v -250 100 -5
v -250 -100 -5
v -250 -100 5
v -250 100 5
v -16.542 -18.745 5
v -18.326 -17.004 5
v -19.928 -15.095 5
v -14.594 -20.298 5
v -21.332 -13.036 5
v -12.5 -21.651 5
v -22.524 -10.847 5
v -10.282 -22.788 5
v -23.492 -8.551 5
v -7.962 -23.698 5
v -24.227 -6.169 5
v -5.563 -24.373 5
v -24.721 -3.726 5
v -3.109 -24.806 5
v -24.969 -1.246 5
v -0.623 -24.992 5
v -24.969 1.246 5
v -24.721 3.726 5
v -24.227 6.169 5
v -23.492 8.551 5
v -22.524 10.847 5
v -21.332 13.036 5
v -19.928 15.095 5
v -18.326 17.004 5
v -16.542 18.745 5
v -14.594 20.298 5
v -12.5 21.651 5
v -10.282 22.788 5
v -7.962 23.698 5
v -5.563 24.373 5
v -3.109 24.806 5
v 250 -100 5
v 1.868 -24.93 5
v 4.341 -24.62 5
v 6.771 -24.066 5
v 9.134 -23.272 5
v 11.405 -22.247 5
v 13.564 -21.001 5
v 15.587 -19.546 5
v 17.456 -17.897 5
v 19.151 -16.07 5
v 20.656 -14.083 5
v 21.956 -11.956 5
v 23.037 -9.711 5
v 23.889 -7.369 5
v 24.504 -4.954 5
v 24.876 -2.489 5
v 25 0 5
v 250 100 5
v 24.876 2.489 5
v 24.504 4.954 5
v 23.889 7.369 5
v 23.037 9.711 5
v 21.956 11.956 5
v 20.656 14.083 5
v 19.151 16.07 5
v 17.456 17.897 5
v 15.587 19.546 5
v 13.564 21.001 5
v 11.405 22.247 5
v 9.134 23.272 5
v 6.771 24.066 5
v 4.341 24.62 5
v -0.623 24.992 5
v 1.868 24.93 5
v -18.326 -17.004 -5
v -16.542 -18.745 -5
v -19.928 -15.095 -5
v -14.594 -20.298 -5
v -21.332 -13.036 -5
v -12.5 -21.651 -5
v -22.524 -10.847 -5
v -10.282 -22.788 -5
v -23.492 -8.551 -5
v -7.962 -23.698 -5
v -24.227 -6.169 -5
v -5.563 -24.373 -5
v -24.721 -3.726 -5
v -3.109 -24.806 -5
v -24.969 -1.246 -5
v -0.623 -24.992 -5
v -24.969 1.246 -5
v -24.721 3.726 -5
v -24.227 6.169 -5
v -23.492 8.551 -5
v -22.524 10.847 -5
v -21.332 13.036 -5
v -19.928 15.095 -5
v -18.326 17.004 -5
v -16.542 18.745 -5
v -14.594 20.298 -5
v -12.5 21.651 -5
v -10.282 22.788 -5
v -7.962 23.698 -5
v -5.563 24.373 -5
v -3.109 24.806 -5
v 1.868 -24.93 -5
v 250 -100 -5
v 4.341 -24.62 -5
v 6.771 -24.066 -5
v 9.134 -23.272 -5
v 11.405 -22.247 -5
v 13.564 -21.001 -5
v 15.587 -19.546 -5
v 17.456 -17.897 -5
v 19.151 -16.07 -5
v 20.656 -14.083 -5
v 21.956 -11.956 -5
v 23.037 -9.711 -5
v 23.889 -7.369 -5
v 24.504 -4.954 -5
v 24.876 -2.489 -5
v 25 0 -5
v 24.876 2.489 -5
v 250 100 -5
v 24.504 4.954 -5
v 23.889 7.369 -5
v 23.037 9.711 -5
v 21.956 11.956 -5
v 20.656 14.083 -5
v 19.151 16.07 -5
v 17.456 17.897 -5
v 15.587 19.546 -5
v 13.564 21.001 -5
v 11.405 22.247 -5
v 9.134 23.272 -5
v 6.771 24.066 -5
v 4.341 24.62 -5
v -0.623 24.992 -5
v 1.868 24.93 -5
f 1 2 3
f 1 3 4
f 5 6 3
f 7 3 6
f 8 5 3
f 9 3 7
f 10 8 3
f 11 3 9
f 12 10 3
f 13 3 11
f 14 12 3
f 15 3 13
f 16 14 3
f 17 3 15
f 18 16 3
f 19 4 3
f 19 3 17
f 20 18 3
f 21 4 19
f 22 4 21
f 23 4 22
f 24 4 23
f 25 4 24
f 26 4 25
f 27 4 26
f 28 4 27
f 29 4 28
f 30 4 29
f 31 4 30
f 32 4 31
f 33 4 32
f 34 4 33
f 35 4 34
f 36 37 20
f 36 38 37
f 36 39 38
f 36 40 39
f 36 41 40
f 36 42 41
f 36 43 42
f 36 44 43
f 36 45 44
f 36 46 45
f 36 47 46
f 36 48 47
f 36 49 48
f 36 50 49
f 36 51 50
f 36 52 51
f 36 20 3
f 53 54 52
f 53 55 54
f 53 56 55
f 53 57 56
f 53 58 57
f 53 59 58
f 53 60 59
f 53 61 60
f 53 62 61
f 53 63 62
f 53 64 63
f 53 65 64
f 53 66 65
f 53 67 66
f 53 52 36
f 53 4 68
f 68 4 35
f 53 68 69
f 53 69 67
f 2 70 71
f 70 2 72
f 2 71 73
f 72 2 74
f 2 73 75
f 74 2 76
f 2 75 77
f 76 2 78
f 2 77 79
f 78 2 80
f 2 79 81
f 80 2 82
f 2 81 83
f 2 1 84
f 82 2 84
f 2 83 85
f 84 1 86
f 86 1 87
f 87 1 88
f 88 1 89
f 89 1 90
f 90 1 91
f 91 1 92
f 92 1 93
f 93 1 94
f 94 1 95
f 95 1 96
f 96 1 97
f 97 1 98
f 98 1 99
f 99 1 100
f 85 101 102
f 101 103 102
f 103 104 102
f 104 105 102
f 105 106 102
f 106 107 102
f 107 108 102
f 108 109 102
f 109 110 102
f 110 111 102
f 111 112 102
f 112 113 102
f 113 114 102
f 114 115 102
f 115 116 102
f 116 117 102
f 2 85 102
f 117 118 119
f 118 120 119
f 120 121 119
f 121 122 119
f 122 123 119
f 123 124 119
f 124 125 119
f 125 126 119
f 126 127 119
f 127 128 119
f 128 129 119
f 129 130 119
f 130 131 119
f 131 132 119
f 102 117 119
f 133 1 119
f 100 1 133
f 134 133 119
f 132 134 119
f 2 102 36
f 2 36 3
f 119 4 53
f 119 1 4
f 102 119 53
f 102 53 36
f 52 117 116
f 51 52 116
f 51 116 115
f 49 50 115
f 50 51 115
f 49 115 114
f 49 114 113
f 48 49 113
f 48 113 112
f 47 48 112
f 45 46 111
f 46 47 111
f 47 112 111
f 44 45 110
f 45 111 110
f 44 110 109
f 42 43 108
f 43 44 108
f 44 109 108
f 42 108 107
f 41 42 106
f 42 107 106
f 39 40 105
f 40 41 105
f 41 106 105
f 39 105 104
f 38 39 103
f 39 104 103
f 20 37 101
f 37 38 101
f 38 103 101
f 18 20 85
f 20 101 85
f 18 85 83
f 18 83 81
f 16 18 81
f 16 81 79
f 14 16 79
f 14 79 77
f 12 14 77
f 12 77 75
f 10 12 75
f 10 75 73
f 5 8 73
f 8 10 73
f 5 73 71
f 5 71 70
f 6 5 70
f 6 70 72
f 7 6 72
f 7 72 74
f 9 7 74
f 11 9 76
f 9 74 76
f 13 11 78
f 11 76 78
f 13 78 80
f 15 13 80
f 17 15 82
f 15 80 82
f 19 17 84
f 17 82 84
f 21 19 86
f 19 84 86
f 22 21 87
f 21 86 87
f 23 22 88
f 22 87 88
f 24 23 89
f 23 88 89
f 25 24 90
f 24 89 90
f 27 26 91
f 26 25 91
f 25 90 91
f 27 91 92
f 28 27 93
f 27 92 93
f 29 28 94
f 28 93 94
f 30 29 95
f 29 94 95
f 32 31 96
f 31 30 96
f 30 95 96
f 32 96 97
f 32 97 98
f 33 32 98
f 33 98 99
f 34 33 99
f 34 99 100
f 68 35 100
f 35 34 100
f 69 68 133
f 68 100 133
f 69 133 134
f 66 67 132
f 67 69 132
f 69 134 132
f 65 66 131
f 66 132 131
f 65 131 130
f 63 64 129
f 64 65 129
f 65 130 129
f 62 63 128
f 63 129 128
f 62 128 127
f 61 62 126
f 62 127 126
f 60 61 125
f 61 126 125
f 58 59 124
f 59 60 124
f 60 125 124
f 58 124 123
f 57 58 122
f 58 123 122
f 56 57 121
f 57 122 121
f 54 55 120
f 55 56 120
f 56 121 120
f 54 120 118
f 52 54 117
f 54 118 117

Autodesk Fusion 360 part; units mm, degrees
sketch "Sketch1" plane through (0, 0, 0) normal (0, 0, 1) x (1, 0, 0)
  circle A0 centre (0, 0) radius 25
  line L0 (-250, 100) -> (250, 100)
  line L1 (250, 100) -> (250, -100)
  line L2 (250, -100) -> (-250, -100)
  line L3 (-250, -100) -> (-250, 100)
  line L4 (-250, 0) -> (250, 0) construction
  line L5 (0, 100) -> (0, -100) construction
  dimension "Total_Width" = 500
  dimension "Total_Height" = 200
  dimension "Hole_Radius" = 25
extrude "Extrude1" add sketch "Sketch1" along normal mid plane 10
equation "Thickness = 1 cm"
